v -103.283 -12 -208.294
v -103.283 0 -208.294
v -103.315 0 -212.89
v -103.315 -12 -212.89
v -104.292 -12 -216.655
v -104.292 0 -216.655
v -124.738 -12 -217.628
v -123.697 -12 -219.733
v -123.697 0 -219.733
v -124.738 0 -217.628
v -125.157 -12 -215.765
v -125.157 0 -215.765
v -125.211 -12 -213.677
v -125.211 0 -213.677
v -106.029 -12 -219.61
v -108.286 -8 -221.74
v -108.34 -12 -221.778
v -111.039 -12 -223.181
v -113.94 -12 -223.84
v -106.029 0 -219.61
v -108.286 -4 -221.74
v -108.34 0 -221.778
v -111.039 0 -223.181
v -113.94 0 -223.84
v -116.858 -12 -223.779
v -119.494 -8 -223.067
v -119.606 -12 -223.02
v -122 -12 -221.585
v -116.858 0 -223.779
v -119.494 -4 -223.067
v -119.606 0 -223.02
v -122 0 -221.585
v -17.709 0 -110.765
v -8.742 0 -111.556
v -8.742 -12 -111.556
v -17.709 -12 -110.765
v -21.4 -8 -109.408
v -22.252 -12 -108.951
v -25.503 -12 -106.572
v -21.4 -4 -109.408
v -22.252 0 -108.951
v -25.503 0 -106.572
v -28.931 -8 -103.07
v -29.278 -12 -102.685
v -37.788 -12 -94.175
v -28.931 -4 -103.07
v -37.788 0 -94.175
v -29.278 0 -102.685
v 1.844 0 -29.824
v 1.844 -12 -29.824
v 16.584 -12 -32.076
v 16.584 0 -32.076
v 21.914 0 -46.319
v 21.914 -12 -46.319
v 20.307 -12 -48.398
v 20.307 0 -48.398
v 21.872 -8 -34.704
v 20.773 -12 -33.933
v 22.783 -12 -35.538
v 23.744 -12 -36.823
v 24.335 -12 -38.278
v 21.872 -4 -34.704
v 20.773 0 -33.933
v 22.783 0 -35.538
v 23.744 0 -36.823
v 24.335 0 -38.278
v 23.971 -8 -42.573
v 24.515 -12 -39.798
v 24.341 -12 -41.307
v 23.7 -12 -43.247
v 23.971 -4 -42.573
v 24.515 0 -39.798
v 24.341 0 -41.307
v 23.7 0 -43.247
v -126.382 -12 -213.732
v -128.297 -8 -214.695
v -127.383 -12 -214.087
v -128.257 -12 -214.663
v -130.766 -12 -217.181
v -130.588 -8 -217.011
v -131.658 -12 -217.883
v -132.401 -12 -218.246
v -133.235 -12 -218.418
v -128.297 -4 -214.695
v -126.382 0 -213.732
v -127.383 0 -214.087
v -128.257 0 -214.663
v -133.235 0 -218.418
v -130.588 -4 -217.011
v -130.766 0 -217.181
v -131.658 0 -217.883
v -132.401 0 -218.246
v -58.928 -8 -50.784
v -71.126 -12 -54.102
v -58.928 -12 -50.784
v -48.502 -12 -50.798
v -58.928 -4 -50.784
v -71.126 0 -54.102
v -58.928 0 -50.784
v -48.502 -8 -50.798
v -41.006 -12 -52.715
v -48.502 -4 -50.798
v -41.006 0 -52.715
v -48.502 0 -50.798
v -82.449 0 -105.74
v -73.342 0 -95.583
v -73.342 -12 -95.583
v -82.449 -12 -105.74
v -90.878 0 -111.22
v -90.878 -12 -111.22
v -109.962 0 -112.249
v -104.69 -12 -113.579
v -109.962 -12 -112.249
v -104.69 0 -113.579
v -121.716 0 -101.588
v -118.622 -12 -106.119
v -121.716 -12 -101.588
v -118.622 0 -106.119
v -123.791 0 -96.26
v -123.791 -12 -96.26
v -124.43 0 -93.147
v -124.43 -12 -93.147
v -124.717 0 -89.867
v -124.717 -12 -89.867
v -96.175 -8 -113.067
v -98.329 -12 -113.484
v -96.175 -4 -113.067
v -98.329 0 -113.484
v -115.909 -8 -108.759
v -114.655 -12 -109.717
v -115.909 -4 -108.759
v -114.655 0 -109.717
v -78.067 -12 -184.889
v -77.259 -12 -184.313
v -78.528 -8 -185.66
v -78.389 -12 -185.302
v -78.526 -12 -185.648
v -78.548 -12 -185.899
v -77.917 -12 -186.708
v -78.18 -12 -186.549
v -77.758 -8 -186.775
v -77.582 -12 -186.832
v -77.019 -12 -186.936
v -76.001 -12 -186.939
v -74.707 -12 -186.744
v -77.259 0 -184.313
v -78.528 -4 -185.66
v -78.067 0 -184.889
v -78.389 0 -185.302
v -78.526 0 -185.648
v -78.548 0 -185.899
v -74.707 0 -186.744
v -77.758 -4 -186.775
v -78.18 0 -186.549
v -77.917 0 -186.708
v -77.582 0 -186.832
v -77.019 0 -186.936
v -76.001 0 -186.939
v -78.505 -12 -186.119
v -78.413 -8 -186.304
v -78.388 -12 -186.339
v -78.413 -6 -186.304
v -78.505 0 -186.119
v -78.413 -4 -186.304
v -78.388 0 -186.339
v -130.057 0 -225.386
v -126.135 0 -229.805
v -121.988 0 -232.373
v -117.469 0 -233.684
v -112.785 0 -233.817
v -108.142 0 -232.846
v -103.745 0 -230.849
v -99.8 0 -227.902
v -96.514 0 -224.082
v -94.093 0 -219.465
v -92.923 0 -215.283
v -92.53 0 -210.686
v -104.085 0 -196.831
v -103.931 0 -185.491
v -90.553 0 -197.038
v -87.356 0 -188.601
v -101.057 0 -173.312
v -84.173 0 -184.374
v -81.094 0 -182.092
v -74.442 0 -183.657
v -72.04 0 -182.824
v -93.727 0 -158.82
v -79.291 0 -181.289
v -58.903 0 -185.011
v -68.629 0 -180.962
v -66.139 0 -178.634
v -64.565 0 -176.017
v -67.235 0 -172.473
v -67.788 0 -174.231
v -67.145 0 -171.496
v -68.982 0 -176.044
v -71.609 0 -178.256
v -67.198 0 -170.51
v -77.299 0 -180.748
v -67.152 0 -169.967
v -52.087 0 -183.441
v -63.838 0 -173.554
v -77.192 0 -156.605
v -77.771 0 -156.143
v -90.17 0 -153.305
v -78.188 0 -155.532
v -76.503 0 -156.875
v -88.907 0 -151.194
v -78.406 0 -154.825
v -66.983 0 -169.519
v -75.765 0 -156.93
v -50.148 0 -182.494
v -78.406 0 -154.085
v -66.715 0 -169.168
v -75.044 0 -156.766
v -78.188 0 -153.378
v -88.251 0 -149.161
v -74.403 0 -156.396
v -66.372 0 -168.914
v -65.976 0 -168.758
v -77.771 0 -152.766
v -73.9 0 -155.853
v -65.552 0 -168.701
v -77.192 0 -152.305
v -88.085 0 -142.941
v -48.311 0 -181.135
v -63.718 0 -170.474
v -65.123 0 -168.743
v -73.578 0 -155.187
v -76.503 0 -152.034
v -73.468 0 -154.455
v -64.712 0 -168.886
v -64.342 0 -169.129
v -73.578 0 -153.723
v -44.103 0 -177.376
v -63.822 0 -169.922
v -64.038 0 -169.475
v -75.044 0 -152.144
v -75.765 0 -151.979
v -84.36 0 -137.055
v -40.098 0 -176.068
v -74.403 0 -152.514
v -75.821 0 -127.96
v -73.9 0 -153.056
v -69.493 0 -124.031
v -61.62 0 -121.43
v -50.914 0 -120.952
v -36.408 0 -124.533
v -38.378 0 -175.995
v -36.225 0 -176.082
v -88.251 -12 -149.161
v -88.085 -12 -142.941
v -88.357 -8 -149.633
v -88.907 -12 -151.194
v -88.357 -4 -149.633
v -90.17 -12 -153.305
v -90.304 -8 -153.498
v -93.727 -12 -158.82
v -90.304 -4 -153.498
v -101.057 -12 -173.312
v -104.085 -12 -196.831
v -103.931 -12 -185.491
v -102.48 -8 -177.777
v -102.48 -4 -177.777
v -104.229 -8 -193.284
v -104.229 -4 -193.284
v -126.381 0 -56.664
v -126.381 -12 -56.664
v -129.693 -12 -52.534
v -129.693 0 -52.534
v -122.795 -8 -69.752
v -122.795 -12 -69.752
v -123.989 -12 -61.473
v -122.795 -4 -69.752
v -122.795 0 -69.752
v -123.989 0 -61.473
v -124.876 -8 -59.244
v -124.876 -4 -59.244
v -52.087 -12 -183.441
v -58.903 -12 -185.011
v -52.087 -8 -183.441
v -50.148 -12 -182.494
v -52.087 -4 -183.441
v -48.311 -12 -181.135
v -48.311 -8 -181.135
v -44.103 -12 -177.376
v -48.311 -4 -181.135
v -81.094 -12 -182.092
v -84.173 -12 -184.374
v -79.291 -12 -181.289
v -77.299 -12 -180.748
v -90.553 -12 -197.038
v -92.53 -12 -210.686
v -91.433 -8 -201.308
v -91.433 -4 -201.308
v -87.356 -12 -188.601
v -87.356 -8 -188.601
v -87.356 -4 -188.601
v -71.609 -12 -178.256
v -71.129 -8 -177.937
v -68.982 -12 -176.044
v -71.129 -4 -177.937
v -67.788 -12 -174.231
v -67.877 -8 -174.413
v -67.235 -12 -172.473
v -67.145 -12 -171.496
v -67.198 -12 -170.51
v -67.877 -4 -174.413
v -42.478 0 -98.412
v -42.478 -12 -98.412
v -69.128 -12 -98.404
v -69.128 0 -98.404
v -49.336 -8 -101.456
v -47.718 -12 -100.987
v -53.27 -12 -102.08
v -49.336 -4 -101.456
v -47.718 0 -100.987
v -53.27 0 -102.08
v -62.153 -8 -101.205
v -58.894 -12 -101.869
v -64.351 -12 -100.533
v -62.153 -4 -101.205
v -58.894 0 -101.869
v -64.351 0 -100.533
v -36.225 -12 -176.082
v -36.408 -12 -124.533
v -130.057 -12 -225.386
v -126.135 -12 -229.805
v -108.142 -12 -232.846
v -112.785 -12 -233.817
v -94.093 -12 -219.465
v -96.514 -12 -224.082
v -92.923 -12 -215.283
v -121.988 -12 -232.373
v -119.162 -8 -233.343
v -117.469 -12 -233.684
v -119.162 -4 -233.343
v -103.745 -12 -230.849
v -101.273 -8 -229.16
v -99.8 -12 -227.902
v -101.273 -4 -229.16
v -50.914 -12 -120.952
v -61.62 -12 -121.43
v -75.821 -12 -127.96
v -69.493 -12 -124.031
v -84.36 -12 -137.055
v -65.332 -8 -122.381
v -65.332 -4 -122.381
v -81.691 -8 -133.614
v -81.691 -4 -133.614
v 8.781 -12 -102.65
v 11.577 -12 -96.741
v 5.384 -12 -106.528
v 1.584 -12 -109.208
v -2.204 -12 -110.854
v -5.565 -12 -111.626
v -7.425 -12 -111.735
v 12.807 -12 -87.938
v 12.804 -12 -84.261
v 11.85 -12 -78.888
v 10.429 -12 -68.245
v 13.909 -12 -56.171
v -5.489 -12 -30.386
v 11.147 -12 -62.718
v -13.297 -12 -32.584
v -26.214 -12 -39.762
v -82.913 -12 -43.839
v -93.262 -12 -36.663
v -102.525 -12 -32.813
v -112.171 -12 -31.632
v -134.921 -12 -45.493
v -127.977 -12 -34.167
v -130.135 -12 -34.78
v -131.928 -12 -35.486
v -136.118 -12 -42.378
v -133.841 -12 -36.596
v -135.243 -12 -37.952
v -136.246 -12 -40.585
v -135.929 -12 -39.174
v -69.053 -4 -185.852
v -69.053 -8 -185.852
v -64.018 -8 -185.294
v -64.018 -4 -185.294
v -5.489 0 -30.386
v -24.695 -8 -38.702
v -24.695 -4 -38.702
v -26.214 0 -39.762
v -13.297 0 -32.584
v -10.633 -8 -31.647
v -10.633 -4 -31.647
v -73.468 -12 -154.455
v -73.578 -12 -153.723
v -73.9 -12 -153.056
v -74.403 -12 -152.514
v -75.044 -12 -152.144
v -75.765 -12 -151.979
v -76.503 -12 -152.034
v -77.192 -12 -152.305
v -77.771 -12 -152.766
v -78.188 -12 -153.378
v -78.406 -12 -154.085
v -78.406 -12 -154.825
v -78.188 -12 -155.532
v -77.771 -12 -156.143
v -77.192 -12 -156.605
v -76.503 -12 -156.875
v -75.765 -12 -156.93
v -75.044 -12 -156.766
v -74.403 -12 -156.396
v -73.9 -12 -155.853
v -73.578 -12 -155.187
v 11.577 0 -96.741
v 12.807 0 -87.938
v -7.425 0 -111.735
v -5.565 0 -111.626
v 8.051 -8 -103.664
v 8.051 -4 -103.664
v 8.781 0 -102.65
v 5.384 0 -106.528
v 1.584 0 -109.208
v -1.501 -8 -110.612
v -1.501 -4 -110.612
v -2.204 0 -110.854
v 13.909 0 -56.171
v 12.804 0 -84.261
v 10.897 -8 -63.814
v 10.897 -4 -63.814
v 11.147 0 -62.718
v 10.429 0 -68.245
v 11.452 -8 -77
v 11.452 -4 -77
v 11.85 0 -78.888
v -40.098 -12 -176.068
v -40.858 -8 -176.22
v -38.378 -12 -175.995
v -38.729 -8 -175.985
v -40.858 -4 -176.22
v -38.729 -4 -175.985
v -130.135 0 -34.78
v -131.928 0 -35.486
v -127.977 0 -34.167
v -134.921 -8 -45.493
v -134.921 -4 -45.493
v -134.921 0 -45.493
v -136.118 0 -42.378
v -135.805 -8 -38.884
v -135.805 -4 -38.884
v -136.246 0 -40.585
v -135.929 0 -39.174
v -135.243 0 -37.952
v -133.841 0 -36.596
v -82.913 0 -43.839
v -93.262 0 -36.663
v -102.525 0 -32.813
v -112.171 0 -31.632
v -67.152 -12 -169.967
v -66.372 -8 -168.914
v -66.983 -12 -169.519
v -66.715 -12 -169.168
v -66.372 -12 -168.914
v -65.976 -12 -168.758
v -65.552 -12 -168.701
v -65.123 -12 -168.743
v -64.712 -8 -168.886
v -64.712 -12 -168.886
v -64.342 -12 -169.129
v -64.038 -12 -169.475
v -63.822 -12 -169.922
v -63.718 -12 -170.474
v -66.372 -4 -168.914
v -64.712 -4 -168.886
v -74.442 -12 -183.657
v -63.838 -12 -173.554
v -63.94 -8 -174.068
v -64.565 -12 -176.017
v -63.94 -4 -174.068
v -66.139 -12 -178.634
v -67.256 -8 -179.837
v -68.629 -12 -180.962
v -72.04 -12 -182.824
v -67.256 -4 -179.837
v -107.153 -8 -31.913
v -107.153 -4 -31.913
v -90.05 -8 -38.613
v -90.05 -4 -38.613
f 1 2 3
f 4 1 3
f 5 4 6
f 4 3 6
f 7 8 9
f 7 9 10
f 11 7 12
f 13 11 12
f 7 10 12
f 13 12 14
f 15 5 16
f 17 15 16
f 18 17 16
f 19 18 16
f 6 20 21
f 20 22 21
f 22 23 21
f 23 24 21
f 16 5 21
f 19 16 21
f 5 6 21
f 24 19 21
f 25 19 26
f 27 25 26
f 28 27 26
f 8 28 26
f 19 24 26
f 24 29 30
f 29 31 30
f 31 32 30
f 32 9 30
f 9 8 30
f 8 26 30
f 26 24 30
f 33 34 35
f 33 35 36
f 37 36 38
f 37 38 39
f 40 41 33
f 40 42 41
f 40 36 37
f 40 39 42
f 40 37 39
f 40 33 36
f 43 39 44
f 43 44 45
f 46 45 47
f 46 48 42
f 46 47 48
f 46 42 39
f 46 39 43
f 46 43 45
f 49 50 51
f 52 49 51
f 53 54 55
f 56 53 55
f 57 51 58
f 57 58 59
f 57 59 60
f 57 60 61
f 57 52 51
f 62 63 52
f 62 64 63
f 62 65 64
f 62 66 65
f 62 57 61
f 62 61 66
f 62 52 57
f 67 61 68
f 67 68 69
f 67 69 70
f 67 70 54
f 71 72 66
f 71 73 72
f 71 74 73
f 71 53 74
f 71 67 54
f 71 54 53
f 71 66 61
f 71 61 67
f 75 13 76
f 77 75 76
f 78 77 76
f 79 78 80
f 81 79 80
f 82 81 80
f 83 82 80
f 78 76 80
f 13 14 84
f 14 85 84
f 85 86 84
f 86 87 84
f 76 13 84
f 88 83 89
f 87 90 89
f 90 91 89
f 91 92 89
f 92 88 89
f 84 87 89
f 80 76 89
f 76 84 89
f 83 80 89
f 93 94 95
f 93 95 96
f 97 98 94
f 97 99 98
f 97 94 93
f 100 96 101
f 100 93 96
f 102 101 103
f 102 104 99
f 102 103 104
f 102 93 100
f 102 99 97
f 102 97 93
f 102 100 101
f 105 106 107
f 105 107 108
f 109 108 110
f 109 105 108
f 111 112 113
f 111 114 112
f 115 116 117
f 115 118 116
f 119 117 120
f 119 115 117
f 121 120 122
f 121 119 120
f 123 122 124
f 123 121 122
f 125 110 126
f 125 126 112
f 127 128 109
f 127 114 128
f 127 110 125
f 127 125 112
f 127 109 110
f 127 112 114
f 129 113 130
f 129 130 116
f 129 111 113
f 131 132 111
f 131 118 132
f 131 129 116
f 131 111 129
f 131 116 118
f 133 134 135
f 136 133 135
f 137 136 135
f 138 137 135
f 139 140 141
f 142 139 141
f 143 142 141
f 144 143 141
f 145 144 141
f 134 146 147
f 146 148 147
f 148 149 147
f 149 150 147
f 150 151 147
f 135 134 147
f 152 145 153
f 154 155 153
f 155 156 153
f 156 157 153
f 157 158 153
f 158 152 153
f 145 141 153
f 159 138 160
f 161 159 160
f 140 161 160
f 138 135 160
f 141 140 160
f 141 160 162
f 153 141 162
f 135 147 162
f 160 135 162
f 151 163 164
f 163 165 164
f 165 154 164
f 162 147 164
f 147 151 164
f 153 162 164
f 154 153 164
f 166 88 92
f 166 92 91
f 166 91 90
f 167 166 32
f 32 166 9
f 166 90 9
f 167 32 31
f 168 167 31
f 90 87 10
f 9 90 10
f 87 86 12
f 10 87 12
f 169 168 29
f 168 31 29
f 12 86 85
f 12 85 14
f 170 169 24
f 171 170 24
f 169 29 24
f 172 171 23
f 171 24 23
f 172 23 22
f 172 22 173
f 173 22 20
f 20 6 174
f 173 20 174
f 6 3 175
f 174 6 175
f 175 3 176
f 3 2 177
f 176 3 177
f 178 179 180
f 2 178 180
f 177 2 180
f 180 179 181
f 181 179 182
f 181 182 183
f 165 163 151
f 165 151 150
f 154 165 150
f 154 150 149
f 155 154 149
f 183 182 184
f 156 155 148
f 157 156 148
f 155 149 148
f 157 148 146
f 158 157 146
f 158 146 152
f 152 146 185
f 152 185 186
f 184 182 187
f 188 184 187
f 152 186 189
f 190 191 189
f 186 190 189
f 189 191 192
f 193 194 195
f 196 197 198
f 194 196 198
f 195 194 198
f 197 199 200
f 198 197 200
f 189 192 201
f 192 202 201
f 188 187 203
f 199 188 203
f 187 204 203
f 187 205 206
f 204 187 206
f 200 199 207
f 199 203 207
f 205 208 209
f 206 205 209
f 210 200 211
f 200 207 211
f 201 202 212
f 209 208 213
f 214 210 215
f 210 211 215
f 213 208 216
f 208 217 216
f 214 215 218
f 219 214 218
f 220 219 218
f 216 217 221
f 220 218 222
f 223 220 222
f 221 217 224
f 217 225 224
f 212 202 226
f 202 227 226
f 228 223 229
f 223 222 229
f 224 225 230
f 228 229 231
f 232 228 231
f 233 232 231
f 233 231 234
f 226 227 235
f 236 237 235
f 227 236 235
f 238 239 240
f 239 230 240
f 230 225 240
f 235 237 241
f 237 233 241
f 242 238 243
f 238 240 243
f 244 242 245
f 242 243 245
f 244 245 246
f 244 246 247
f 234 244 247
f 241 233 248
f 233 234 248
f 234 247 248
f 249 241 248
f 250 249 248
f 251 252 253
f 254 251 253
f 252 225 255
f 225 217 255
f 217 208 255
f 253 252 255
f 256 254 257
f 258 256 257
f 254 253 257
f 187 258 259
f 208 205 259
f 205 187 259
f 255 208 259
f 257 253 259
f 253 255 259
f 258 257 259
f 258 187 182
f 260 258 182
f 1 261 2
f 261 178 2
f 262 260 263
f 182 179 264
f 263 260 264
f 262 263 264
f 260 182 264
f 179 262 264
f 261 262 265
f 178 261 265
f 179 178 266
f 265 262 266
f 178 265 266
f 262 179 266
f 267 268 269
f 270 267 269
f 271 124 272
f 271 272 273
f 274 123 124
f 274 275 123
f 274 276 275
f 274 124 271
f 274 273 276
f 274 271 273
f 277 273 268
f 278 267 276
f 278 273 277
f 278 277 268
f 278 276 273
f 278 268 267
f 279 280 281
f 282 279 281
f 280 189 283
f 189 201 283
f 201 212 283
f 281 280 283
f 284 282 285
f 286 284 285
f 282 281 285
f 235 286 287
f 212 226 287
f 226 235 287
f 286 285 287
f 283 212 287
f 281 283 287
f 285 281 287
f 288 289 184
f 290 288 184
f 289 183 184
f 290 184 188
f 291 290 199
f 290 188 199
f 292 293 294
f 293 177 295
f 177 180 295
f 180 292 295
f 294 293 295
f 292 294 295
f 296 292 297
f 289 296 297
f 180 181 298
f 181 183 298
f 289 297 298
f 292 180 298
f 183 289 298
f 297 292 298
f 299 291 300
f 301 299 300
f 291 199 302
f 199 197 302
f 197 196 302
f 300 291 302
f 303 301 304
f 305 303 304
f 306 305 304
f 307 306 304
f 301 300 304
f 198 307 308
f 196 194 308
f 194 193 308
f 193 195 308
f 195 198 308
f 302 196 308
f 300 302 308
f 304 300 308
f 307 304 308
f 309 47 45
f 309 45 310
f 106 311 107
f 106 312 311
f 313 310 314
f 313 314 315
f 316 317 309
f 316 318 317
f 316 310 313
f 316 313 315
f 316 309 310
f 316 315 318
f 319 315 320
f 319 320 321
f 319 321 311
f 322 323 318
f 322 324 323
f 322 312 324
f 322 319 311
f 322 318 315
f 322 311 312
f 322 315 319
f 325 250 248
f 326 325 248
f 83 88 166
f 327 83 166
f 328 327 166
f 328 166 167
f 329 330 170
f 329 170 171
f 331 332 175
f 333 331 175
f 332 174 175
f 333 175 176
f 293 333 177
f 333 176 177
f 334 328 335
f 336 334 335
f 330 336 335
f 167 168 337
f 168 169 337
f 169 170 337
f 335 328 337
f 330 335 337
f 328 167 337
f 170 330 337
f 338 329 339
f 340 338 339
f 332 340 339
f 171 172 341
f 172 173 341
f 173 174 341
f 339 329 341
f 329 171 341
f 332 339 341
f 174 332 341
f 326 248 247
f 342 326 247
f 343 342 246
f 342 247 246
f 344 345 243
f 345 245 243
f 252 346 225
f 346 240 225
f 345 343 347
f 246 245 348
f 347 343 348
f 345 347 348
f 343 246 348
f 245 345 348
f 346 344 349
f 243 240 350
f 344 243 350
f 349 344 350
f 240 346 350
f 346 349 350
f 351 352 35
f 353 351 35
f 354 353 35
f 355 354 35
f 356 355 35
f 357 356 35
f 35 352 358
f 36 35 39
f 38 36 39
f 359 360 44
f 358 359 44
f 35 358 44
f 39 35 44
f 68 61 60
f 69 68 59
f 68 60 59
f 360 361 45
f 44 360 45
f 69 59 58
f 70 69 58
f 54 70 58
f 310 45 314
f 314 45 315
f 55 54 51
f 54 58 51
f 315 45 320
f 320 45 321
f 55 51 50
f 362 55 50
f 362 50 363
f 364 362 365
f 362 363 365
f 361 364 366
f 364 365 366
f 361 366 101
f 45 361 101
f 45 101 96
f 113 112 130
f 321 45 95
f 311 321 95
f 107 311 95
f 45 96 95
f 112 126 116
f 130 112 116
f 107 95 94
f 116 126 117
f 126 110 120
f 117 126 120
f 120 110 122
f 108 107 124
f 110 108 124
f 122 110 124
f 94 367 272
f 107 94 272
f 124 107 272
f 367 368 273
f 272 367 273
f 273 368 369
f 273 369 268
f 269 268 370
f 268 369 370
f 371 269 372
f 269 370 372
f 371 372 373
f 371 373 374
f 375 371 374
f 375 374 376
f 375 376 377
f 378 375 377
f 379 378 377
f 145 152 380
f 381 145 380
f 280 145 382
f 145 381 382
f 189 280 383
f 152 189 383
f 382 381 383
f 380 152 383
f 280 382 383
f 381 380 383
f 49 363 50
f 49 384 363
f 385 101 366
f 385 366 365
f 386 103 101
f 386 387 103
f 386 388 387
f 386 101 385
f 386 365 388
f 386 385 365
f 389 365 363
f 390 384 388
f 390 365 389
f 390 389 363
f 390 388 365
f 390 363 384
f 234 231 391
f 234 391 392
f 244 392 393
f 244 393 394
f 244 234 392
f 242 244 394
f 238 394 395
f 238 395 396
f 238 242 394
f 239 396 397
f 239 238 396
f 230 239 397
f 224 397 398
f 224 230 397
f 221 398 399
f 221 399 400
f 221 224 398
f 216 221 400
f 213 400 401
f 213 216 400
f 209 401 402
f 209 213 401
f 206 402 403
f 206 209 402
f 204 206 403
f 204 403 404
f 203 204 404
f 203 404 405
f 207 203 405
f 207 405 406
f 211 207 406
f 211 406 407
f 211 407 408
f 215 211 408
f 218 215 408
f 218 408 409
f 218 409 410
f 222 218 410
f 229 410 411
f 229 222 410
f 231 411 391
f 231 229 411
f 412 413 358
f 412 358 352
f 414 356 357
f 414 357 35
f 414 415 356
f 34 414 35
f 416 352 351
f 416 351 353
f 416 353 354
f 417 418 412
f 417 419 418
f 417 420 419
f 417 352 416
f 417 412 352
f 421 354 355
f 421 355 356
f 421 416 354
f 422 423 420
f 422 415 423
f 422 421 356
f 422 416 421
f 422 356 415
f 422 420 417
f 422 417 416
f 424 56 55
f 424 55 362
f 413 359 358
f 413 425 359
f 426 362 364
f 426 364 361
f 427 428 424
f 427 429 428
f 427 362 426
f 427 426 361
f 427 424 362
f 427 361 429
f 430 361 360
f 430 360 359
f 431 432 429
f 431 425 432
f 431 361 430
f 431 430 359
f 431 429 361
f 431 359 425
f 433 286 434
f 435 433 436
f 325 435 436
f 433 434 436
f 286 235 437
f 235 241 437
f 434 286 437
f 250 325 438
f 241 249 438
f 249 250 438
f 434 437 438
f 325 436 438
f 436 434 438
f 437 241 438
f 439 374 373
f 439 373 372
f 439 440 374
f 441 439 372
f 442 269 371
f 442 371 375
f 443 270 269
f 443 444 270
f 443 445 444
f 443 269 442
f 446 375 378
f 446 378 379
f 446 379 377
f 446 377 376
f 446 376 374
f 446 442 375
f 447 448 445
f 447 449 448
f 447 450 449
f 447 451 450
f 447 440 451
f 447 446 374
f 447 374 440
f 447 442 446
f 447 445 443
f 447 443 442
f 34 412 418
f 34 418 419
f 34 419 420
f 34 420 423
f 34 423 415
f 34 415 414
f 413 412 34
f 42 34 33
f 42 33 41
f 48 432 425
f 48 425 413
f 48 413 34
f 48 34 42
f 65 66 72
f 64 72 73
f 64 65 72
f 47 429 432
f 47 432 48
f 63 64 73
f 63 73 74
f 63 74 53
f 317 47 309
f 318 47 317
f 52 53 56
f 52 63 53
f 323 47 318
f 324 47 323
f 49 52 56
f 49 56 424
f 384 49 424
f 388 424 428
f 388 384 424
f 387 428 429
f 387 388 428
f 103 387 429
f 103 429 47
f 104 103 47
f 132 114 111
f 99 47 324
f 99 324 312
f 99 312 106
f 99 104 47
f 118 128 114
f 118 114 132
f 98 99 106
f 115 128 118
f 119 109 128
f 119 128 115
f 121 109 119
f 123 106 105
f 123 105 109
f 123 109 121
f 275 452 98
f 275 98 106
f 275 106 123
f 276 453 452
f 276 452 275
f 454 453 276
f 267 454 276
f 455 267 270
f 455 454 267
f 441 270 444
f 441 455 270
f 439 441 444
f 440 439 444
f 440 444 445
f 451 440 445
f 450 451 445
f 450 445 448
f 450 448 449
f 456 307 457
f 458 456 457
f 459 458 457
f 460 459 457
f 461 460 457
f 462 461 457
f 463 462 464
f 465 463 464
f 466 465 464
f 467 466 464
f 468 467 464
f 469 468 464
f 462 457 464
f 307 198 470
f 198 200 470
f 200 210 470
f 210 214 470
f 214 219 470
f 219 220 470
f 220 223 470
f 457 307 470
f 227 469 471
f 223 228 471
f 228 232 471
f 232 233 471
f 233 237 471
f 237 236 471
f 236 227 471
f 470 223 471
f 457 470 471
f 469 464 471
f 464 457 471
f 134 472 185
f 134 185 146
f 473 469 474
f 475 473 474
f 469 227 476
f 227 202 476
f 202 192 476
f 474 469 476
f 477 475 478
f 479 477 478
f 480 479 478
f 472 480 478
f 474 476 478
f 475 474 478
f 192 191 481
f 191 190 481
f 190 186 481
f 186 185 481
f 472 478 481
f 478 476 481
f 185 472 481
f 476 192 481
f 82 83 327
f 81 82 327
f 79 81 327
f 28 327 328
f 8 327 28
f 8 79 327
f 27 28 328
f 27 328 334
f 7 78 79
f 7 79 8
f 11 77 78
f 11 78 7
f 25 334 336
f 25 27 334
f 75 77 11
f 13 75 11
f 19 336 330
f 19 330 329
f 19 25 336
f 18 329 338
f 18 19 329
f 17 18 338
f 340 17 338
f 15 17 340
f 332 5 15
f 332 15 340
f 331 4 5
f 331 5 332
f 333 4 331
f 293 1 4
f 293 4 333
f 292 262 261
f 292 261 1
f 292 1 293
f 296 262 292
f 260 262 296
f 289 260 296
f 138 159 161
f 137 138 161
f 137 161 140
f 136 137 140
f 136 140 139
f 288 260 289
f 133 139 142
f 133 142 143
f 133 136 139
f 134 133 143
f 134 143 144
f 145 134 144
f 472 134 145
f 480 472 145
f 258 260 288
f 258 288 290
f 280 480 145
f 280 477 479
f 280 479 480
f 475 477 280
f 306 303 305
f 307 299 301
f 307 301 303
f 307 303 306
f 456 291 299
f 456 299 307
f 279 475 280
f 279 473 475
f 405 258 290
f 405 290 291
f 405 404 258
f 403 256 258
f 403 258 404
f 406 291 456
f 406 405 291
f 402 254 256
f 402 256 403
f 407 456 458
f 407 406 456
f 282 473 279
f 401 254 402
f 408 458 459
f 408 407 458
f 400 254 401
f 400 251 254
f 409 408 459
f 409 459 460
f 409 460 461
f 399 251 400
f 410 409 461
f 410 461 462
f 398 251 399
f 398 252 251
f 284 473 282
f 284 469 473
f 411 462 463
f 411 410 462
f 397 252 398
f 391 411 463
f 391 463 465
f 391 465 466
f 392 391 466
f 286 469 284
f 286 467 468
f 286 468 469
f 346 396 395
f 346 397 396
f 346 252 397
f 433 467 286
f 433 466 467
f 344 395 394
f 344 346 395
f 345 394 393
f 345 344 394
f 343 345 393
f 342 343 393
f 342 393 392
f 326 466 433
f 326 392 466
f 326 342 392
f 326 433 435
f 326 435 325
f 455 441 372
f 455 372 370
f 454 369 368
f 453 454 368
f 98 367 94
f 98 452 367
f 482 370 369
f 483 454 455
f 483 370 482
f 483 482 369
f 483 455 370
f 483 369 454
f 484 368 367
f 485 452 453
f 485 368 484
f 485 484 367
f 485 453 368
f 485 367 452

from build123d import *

# Parameters (mm, degrees)
F0_R     = 2.482682
F1_DEPTH = 12


with BuildPart() as f1:
    # F0 (on Front) → F1 (new body)
    with BuildSketch(Plane.XZ):
        with BuildLine():
            add(Edge.make_bspline(
                [(-71.12636, -54.101607), (-58.428441, -48.642112), (-46.649857, -50.322257), (-41.006338, -52.714616)],
                knots=[0, 0, 0, 0, 30.15194, 30.15194, 30.15194, 30.15194], degree=3))
            add(Edge.make_bspline(
                [(-127.976823, -34.166812), (-103.445357, -27.380814), (-92.80645, -34.273334), (-71.12636, -54.101607)],
                knots=[0, 0, 0, 0, 60.244263, 60.244263, 60.244263, 60.244263], degree=3))
            add(Edge.make_bspline(
                [(-129.692707, -52.534002), (-135.636478, -45.765712), (-141.618297, -37.449518), (-127.976823, -34.166812)],
                knots=[0, 0, 0, 0, 18.447166, 18.447166, 18.447166, 18.447166], degree=3))
            add(Edge.make_bspline(
                [(-124.716592, -89.866787), (-120.372589, -63.011825), (-123.929403, -59.281508), (-129.692707, -52.534002)],
                knots=[0, 0, 0, 0, 37.66296, 37.66296, 37.66296, 37.66296], degree=3))
            add(Edge.make_bspline(
                [(-73.34189, -95.583062), (-95.115456, -126.364396), (-123.981745, -113.648796), (-124.716592, -89.866787)],
                knots=[0, 0, 0, 0, 51.691739, 51.691739, 51.691739, 51.691739], degree=3))
            add(Edge.make_bspline(
                [(-37.787983, -94.175354), (-47.736767, -105.94183), (-63.93146, -103.169765), (-73.34189, -95.583062)],
                knots=[0, 0, 0, 0, 35.581764, 35.581764, 35.581764, 35.581764], degree=3))
            add(Edge.make_bspline(
                [(-8.74165, -111.555661), (-26.116133, -112.047875), (-26.116133, -103.804632), (-37.787983, -94.175354)],
                knots=[0, 0, 0, 0, 33.849144, 33.849144, 33.849144, 33.849144], degree=3))
            add(Edge.make_bspline(
                [(12.806772, -87.937936), (12.819949, -108.976523), (-5.027692, -112.690483), (-8.74165, -111.555661)],
                knots=[0, 0, 0, 0, 31.97079, 31.97079, 31.97079, 31.97079], degree=3))
            add(Edge.make_bspline(
                [(20.307293, -48.398496), (2.858819, -64.922817), (14.106442, -78.130892), (12.806772, -87.937936)],
                knots=[0, 0, 0, 0, 40.244566, 40.244566, 40.244566, 40.244566], degree=3))
            add(Edge.make_bspline(
                [(1.843561, -29.823521), (34.89311, -31.53218), (22.796147, -45.271948), (20.307293, -48.398496)],
                knots=[0, 0, 0, 0, 26.190439, 26.190439, 26.190439, 26.190439], degree=3))
            add(Edge.make_bspline(
                [(-41.006338, -52.714616), (-23.349135, -34.648479), (-10.061553, -29.605528), (1.843561, -29.823521)],
                knots=[0, 0, 0, 0, 48.581026, 48.581026, 48.581026, 48.581026], degree=3))
        make_face()
        with BuildLine():
            Line((-36.225362, -176.082114), (-36.407538, -124.533342))
            add(Edge.make_bspline(
                [(-36.407538, -124.533342), (-72.480577, -110.592157), (-85.808396, -139.664307), (-88.0847, -142.941165)],
                knots=[0, 0, 0, 0, 54.857789, 54.857789, 54.857789, 54.857789], degree=3))
            add(Edge.make_bspline(
                [(-88.0847, -142.941165), (-87.453275, -152.473873), (-89.633037, -151.340918), (-93.726896, -158.820441)],
                knots=[0, 0, 0, 0, 16.851878, 16.851878, 16.851878, 16.851878], degree=3))
            add(Edge.make_bspline(
                [(-93.726896, -158.820441), (-107.418011, -180.484537), (-104.141617, -192.549328), (-103.282584, -208.29365)],
                knots=[0, 0, 0, 0, 50.387593, 50.387593, 50.387593, 50.387593], degree=3))
            add(Edge.make_bspline(
                [(-103.282584, -208.29365), (-101.283793, -228.266485), (-126.139562, -227.957859), (-125.211084, -213.676676)],
                knots=[0, 0, 0, 0, 22.57955, 22.57955, 22.57955, 22.57955], degree=3))
            add(Edge.make_bspline(
                [(-125.211084, -213.676676), (-129.077386, -213.311934), (-130.025722, -218.19952), (-133.23548, -218.418365)],
                knots=[0, 0, 0, 0, 9.320652, 9.320652, 9.320652, 9.320652], degree=3))
            add(Edge.make_bspline(
                [(-133.23548, -218.418365), (-125.391055, -244.501648), (-92.378079, -234.700922), (-92.529905, -210.685762)],
                knots=[0, 0, 0, 0, 41.433525, 41.433525, 41.433525, 41.433525], degree=3))
            add(Edge.make_bspline(
                [(-92.529905, -210.685762), (-91.922687, -205.700118), (-91.346807, -183.447118), (-77.299349, -180.748045)],
                knots=[0, 0, 0, 0, 33.589235, 33.589235, 33.589235, 33.589235], degree=3))
            add(Edge.make_bspline(
                [(-77.299349, -180.748045), (-69.556281, -178.404093), (-66.703469, -174.492564), (-67.198433, -170.509711)],
                knots=[0, 0, 0, 0, 14.38235, 14.38235, 14.38235, 14.38235], degree=3))
            add(Edge.make_bspline(
                [(-67.198433, -170.509711), (-67.288168, -168.147057), (-63.879341, -168.061122), (-63.717723, -170.473576)],
                knots=[0, 0, 0, 0, 3.480898, 3.480898, 3.480898, 3.480898], degree=3))
            add(Edge.make_bspline(
                [(-63.717723, -170.473576), (-63.590482, -171.825111), (-62.715396, -181.639284), (-77.25884, -184.313014)],
                knots=[0, 0, 0, 0, 19.362126, 19.362126, 19.362126, 19.362126], degree=3))
            add(Edge.make_bspline(
                [(-77.25884, -184.313014), (-79.468457, -185.470457), (-78.97826, -187.653788), (-74.706644, -186.743677)],
                knots=[0, 0, 0, 0, 3.524461, 3.524461, 3.524461, 3.524461], degree=3))
            add(Edge.make_bspline(
                [(-74.706644, -186.743677), (-68.510663, -185.666003), (-64.290475, -185.174857), (-58.902549, -185.011277)],
                knots=[0, 0, 0, 0, 15.898761, 15.898761, 15.898761, 15.898761], degree=3))
            add(Edge.make_bspline(
                [(-58.902549, -185.011277), (-49.408777, -183.57144), (-49.684819, -182.099215), (-44.102641, -177.375837)],
                knots=[0, 0, 0, 0, 16.653445, 16.653445, 16.653445, 16.653445], degree=3))
            add(Edge.make_bspline(
                [(-44.102641, -177.375837), (-39.803862, -175.561603), (-39.41348, -176.017051), (-36.225362, -176.082114)],
                knots=[0, 0, 0, 0, 7.98281, 7.98281, 7.98281, 7.98281], degree=3))
        make_face()
        with Locations((-75.950864, -154.454722)):
            Circle(F0_R, mode=Mode.SUBTRACT)
    extrude(amount=F1_DEPTH)


solid = f1.part
